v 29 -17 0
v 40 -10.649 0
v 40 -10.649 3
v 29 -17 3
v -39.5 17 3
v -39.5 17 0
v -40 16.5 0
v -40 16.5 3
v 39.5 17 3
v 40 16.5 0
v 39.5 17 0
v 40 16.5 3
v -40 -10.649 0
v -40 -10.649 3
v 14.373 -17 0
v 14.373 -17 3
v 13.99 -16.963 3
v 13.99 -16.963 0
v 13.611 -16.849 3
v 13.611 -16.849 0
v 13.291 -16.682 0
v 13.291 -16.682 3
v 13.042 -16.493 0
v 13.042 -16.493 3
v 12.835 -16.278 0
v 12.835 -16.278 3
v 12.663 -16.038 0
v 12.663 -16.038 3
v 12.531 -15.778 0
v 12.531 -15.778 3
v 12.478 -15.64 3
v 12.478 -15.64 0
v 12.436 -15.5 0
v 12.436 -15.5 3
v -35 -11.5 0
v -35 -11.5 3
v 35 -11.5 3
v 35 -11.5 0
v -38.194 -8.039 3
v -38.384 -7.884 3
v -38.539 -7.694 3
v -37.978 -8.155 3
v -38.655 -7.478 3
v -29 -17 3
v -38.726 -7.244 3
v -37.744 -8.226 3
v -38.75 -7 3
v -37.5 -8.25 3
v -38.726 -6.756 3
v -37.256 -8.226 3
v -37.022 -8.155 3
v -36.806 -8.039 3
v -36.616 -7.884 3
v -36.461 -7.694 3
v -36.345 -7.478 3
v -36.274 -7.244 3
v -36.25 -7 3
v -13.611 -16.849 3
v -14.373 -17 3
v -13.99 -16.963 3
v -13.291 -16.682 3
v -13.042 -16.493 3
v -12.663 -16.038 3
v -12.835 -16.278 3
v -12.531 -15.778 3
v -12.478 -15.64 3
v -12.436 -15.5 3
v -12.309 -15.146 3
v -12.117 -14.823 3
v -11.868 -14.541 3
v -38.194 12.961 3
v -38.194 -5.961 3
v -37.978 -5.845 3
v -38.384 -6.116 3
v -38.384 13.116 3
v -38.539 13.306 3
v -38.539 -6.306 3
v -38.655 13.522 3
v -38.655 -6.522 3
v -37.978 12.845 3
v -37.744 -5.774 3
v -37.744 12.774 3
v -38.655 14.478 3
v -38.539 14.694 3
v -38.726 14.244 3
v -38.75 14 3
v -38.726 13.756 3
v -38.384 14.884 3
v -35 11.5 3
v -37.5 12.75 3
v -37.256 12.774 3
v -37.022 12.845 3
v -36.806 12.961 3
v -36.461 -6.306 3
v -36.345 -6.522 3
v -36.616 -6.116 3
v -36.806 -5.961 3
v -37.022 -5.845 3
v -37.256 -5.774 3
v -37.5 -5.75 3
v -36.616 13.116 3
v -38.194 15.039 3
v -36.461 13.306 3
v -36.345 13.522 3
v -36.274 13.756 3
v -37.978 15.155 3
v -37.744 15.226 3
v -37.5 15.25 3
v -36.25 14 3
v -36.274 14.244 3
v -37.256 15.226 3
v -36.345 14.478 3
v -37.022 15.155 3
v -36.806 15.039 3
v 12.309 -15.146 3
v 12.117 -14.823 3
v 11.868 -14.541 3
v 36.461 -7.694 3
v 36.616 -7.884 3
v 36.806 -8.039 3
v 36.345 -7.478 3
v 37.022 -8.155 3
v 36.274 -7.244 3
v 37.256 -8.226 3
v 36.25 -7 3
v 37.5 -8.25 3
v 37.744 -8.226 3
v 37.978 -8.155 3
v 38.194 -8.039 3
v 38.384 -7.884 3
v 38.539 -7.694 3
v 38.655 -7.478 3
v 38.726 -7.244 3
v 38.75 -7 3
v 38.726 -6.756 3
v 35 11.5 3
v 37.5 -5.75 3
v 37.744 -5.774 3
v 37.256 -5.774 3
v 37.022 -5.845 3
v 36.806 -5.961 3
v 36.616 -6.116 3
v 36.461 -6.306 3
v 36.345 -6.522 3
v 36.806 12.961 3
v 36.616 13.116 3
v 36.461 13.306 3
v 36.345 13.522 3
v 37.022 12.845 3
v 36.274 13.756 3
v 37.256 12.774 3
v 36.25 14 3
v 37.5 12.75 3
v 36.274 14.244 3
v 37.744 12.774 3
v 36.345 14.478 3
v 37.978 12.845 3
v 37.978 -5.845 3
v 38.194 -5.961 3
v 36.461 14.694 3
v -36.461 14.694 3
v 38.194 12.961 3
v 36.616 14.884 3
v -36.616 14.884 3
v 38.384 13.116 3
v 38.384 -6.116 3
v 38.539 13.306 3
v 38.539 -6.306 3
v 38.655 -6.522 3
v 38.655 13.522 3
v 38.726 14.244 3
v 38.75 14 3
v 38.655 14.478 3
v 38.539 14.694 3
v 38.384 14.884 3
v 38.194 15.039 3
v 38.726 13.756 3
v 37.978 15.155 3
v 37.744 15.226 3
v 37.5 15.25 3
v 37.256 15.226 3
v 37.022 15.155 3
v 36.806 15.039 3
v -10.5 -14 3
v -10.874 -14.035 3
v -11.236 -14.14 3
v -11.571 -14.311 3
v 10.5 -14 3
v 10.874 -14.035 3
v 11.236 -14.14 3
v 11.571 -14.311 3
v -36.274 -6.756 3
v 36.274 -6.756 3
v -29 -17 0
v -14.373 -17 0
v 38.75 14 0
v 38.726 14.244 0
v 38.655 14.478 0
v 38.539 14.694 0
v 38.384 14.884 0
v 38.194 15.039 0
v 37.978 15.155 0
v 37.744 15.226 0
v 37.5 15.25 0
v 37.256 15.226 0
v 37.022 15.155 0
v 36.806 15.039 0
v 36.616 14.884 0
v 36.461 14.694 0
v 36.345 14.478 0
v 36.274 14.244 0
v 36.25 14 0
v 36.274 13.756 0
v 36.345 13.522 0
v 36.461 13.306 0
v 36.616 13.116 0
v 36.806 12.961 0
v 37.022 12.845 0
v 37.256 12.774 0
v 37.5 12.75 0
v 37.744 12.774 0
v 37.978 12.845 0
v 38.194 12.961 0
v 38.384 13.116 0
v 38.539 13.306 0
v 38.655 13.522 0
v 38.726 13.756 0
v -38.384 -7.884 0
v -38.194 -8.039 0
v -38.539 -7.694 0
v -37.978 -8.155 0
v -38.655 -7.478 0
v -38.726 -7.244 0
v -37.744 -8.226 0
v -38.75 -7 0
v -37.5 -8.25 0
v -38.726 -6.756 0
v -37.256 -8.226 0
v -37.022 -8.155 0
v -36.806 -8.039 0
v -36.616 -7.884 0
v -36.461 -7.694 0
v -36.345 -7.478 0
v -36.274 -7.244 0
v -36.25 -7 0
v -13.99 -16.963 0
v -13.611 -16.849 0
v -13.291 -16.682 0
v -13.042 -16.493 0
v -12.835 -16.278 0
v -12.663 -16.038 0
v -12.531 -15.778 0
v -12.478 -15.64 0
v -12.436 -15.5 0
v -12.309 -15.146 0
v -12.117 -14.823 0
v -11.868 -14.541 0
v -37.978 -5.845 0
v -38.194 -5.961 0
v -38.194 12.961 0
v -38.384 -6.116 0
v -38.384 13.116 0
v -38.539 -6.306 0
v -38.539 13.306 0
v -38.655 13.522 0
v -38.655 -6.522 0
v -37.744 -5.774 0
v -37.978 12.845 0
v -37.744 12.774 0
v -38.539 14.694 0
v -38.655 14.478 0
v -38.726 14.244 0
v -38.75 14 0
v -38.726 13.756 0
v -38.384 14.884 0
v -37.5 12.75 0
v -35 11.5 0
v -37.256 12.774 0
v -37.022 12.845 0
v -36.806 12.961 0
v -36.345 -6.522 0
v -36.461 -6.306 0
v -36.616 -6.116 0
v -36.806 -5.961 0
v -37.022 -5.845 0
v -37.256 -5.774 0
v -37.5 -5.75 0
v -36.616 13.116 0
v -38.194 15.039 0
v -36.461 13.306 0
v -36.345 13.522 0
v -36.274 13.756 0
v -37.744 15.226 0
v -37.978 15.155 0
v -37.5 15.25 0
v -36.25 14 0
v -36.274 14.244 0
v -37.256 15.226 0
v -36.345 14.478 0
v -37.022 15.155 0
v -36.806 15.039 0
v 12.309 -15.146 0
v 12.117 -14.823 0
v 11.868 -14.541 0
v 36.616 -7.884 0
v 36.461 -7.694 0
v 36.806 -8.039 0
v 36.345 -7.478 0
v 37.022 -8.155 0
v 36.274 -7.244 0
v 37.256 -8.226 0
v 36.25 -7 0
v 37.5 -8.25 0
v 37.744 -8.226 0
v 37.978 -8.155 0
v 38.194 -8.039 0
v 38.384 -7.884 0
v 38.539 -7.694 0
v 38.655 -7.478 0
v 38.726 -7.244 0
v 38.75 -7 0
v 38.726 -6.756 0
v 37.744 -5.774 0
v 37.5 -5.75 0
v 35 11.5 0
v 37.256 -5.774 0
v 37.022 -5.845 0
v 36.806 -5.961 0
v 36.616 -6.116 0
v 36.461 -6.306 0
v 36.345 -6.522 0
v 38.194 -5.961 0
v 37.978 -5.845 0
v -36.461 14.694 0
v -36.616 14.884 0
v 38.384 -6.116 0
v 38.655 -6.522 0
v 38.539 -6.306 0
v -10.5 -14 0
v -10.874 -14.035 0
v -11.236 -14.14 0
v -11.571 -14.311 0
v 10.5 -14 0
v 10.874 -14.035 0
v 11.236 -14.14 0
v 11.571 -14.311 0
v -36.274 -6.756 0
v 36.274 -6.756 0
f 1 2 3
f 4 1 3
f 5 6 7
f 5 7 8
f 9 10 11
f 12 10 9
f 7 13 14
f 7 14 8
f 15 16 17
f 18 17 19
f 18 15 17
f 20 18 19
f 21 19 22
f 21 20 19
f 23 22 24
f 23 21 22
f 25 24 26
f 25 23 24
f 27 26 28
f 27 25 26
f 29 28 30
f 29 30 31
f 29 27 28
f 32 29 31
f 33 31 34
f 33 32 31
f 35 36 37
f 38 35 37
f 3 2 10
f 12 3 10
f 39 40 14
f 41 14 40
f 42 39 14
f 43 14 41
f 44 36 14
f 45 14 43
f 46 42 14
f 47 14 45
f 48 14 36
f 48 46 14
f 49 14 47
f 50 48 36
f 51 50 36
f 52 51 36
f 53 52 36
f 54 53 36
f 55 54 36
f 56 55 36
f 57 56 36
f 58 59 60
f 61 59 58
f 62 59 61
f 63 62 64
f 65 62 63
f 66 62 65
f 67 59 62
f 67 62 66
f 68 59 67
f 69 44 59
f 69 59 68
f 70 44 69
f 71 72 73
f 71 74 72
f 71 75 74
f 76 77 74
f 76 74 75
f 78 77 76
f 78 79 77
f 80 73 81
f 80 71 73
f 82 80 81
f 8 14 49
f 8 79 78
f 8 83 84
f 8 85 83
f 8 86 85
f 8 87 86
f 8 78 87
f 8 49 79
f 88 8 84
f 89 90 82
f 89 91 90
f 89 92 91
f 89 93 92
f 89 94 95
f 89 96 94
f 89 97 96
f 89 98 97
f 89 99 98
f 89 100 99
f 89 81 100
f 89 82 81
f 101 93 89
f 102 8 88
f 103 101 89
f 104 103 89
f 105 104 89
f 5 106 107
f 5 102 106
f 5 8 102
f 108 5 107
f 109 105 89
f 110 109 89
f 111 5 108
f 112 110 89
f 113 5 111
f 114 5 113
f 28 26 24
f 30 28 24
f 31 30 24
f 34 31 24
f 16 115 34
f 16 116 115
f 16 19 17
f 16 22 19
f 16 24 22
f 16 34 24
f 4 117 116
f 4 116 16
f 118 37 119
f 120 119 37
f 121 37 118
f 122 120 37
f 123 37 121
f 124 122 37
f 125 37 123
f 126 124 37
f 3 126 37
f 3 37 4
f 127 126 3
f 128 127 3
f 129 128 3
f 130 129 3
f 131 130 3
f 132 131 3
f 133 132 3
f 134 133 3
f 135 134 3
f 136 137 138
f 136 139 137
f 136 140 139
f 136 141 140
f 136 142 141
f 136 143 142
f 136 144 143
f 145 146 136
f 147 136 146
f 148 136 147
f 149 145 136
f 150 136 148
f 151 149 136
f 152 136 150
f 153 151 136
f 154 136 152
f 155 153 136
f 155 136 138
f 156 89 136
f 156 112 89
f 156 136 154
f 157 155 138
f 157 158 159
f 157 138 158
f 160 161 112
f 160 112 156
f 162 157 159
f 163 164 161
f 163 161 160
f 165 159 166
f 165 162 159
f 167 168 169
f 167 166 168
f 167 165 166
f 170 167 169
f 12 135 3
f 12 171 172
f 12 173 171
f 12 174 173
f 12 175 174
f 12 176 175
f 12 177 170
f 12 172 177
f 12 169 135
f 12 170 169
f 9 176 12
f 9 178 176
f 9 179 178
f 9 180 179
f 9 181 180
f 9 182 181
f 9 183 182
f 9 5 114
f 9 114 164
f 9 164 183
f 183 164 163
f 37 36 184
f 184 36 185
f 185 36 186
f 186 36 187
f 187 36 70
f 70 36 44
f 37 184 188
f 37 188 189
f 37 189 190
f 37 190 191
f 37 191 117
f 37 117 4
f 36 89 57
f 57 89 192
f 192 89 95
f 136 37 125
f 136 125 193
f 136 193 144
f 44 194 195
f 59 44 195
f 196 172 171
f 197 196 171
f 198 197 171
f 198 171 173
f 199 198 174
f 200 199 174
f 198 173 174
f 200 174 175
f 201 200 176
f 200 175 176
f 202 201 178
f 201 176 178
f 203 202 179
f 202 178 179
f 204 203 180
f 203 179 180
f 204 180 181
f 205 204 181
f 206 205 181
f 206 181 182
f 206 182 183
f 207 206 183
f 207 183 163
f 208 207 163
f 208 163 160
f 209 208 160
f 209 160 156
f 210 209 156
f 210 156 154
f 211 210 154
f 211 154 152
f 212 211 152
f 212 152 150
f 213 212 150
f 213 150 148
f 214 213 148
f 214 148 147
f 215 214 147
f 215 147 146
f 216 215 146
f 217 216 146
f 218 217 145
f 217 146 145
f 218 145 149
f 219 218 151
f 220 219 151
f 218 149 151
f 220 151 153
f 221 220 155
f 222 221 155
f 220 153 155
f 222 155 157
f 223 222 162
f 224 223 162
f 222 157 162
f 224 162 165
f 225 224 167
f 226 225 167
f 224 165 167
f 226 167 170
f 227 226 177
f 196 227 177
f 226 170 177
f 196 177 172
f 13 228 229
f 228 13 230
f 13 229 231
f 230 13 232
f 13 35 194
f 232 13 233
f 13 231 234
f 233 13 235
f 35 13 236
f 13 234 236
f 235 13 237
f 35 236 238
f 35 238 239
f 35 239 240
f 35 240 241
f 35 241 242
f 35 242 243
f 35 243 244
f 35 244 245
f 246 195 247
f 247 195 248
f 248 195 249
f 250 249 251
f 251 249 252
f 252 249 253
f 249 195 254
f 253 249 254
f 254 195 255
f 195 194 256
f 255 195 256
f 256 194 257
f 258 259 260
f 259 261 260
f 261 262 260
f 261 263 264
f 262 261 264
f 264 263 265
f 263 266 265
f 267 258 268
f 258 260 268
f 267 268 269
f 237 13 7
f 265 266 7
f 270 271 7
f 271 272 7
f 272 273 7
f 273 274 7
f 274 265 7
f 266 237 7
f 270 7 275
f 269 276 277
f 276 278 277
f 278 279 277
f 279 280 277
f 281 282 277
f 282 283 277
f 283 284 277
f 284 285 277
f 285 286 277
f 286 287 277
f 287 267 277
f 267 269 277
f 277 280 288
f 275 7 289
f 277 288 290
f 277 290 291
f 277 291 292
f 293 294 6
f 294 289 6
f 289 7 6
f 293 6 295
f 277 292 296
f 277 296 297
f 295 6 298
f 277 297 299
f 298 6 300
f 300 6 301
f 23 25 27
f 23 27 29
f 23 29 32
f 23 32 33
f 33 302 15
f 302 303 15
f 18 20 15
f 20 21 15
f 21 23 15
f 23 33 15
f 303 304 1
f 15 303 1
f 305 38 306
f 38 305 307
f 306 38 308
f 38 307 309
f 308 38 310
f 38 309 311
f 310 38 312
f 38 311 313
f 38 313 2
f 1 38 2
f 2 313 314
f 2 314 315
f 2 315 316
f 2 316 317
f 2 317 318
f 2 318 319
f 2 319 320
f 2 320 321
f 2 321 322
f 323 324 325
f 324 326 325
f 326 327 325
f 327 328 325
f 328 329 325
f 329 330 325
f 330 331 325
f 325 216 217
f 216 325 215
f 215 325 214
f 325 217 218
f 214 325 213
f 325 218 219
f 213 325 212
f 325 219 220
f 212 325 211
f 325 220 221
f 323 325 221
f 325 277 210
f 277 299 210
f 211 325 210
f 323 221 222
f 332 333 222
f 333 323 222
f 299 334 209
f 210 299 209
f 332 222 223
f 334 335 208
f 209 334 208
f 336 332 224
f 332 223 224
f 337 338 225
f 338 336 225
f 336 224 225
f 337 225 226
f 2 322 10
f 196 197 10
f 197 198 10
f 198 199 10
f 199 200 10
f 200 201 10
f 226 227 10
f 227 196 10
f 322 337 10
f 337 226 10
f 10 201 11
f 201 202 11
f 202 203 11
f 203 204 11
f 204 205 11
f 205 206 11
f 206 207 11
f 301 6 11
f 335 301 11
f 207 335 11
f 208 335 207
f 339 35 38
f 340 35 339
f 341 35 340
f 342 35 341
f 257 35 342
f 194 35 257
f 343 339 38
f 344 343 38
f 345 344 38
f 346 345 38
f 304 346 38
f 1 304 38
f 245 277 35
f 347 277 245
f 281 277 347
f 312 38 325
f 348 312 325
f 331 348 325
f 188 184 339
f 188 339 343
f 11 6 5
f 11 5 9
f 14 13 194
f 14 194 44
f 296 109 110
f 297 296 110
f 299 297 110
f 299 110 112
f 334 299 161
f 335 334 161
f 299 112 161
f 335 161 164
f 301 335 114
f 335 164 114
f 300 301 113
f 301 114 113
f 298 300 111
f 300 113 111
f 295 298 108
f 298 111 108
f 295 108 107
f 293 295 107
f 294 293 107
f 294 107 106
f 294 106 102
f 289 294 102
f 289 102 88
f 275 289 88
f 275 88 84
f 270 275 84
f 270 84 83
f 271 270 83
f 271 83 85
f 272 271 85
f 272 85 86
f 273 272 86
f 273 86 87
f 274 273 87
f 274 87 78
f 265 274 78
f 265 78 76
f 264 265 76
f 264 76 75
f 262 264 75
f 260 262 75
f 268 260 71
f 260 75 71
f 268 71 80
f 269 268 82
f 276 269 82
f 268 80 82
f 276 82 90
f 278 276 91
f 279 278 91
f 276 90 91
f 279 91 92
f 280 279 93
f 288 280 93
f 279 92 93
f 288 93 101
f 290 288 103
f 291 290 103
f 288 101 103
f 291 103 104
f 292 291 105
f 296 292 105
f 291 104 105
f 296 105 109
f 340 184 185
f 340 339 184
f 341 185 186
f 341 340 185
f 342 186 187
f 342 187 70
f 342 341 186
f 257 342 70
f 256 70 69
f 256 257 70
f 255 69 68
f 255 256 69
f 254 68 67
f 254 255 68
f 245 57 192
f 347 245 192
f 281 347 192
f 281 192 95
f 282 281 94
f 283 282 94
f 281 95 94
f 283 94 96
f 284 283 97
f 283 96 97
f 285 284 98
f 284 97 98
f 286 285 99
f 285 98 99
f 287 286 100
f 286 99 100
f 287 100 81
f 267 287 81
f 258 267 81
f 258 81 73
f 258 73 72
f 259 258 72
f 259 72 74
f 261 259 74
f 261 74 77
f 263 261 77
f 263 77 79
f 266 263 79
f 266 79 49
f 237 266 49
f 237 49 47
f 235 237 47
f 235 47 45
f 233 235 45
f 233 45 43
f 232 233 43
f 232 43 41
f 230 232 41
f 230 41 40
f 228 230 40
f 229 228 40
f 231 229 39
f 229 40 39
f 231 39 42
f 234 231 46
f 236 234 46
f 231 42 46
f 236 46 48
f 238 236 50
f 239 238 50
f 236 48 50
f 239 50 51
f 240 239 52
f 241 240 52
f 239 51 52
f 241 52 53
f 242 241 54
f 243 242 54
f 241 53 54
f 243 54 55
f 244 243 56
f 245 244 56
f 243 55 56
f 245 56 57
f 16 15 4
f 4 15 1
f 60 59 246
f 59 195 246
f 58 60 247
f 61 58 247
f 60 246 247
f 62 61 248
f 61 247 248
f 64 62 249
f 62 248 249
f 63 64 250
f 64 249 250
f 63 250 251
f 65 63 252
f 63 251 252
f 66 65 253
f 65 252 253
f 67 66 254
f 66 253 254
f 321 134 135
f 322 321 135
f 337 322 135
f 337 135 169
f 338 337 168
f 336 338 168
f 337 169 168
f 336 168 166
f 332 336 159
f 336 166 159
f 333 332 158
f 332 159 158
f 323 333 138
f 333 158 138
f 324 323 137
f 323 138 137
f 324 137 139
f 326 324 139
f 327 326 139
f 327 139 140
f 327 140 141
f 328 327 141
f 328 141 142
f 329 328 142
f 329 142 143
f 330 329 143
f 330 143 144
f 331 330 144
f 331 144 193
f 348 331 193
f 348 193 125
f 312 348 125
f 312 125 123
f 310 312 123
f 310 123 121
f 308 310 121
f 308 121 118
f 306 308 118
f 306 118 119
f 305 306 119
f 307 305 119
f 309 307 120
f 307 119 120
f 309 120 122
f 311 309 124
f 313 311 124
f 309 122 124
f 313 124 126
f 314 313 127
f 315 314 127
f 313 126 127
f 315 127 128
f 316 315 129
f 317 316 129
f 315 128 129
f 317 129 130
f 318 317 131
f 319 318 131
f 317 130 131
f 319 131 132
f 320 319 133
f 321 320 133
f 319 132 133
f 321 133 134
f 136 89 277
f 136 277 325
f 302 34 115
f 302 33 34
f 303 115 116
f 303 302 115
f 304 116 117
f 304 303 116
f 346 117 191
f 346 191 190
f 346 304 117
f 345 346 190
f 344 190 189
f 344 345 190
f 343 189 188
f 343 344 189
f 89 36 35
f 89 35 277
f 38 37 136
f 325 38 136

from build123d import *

# Parameters (mm, degrees)
SKETCH_1_W              = 80
SKETCH_1_H              = 34
EXTRUDE_1_DEPTH         = 3
SKETCH_2_W              = 70
SKETCH_2_H              = 23
CUT_EXTRUDE_2_DEPTH     = 3
CHAMFER_1_SIZE          = 0.5
SKETCH_7_W              = 25
SKETCH_7_H              = 3
CUT_EXTRUDE_6_DEPTH     = 3
FILLET_2_R              = 2
CHAMFER_2_SIZE          = 11
CHAMFER_2_SIZE2         = 6.350852961
CHAMFER_3_SIZE          = 11
CHAMFER_3_SIZE2         = 6.350852961
FILLET_3_R              = 2
HOLE_WIZARD_2_5_2_5_1_D = 2.5


with BuildPart() as part:
    # 草图1 → Extrude 1 (new body)
    with BuildSketch(Plane.XY):
        Rectangle(SKETCH_1_W, SKETCH_1_H)
    extrude(amount=EXTRUDE_1_DEPTH)

    # 草图2 → 拉伸2 (cut)
    with BuildSketch(Plane.XY.offset(3)):
        Rectangle(SKETCH_2_W, SKETCH_2_H)
    extrude(amount=-CUT_EXTRUDE_2_DEPTH, mode=Mode.SUBTRACT)

    # 倒角1
    chamfer_1_edges = [part.edges().sort_by_distance(p)[0] for p in [
        (-40, 17, 1.5),
        (40, 17, 1.5),
    ]]
    chamfer(chamfer_1_edges, length=CHAMFER_1_SIZE)

    # 草图7 → 拉伸6 (cut)
    with BuildSketch(Plane.XY.offset(3)):
        with Locations((0, -15.5)):
            Rectangle(SKETCH_7_W, SKETCH_7_H)
    extrude(amount=-CUT_EXTRUDE_6_DEPTH, mode=Mode.SUBTRACT)

    # 圆角2
    fillet_2_edges = [part.edges().sort_by_distance(p)[0] for p in [
        (-12.5, -14, 1.5),
        (12.5, -14, 1.5),
    ]]
    fillet(fillet_2_edges, radius=FILLET_2_R)

    # 倒角2
    chamfer_2_edges = [part.edges().sort_by_distance(p)[0] for p in [
        (40, -17, 1.5),
    ]]
    chamfer_2_side = [part.faces().sort_by_distance(p)[0] for p in [
        (26.25, -17, 1.5),
    ]]
    chamfer(chamfer_2_edges, length=CHAMFER_2_SIZE, length2=CHAMFER_2_SIZE2, reference=chamfer_2_side[0])

    # 倒角3
    chamfer_3_edges = [part.edges().sort_by_distance(p)[0] for p in [
        (-40, -17, 1.5),
    ]]
    chamfer_3_side = [part.faces().sort_by_distance(p)[0] for p in [
        (-26.25, -17, 1.5),
    ]]
    chamfer(chamfer_3_edges, length=CHAMFER_3_SIZE, length2=CHAMFER_3_SIZE2, reference=chamfer_3_side[0])

    # 圆角3
    fillet_3_edges = [part.edges().sort_by_distance(p)[0] for p in [
        (12.5, -17, 1.5),
        (-12.5, -17, 1.5),
    ]]
    fillet(fillet_3_edges, radius=FILLET_3_R)

    # Ø2.5 (2.5) 直径孔1 (through all)
    with Locations(Plane(origin=(-37.5, -7, 0), x_dir=(-1, 0, 0), z_dir=(0, 0, -1))):
        with Locations((0, 0), (0, 21), (-75, 21), (-75, 0)):
            Hole(HOLE_WIZARD_2_5_2_5_1_D / 2)


solid = part.part
